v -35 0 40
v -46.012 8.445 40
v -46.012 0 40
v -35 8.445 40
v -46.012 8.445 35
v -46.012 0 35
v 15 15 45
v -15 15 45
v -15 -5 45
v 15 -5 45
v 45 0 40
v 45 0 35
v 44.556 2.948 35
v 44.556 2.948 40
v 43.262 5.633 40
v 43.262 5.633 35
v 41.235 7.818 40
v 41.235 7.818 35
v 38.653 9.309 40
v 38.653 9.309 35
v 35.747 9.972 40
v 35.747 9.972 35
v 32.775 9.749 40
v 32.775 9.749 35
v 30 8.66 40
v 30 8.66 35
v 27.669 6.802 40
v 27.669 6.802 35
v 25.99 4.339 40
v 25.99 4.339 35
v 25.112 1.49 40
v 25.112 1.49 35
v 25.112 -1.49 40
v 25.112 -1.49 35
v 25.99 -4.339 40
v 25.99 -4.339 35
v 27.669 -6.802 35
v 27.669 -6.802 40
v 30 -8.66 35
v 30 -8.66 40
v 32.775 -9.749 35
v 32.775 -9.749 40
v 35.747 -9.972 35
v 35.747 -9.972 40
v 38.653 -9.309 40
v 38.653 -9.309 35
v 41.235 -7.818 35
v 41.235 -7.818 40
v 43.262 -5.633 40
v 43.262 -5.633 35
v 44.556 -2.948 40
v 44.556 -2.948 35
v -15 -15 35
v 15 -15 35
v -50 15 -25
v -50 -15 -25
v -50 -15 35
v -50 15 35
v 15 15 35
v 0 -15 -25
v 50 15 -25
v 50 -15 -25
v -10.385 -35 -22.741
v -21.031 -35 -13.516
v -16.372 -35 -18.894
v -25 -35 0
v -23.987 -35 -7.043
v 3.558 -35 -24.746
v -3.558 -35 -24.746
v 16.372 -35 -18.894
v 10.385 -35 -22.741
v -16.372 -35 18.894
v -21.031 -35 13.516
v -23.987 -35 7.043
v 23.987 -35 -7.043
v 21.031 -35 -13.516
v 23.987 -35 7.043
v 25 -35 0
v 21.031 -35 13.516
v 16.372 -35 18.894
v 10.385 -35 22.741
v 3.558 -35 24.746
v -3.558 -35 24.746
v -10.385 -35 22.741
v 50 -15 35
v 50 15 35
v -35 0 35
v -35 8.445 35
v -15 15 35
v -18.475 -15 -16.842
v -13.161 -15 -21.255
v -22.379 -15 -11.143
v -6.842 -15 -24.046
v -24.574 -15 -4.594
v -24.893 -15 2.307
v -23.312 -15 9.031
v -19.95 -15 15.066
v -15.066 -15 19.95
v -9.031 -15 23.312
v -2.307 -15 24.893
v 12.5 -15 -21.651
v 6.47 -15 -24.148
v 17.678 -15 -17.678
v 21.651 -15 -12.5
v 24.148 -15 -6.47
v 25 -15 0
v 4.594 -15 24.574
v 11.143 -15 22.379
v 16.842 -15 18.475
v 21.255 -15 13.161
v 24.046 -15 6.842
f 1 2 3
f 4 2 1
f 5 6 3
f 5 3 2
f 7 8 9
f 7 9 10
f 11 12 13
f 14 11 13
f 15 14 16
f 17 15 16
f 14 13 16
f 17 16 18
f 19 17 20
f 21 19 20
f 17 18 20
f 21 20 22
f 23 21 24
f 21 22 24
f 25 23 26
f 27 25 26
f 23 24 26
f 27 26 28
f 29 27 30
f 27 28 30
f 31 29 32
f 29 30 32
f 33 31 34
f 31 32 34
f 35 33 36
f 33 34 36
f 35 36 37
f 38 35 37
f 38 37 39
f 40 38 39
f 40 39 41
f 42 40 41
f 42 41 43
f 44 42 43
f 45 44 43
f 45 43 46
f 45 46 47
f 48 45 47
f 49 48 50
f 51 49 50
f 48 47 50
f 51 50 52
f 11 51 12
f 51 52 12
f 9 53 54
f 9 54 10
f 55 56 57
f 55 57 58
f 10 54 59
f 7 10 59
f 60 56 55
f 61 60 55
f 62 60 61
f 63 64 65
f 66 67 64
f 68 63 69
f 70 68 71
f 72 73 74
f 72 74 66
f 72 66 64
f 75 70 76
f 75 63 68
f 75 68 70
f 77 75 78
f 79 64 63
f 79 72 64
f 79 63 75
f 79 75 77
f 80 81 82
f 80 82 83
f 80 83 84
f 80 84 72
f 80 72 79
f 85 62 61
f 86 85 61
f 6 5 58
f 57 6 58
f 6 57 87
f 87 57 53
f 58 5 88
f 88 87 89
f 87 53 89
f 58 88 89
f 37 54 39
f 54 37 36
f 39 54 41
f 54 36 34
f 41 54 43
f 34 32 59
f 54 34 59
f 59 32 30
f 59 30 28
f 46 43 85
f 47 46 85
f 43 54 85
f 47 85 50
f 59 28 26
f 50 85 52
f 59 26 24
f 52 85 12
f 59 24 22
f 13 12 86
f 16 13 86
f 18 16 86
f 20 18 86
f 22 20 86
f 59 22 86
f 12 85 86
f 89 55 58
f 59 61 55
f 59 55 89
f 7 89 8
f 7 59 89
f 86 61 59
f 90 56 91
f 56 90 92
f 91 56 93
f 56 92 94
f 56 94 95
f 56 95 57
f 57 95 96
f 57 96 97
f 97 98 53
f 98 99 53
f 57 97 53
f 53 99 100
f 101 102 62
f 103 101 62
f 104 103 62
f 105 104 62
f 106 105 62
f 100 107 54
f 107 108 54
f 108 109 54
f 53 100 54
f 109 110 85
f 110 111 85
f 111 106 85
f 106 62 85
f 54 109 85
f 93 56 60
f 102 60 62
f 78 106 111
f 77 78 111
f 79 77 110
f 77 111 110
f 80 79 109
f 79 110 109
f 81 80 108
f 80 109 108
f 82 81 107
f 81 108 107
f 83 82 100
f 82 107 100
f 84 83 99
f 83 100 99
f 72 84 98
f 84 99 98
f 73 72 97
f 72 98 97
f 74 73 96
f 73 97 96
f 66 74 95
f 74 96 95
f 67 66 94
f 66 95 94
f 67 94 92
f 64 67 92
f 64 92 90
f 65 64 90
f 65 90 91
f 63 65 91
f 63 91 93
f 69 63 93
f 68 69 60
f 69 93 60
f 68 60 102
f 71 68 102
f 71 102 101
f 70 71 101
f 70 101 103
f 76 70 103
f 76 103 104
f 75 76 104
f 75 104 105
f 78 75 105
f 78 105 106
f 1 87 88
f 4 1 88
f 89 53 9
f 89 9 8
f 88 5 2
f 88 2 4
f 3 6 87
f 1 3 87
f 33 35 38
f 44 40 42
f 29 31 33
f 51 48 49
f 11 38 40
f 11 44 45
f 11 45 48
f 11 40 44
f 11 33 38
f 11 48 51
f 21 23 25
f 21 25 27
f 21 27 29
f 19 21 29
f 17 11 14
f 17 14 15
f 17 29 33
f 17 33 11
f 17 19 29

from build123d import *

# Parameters (mm, degrees)
F0_W      = 100
F0_H      = 50
F1_DEPTH  = 15
F3_R      = 25
F4_DEPTH  = 20
F2_W      = 30
F2_H      = 10
F5_DEPTH  = 100
F6_R      = 10
F7_DEPTH  = 5
F8_W      = 11.012334
F8_H      = 8.445302
F9_DEPTH  = 5
F10_W     = 30
F10_H     = 30
F11_DEPTH = 10
F13_DEPTH = 65.001


with BuildPart() as f1:
    # F0 (on Front) → F1 (new body, symmetric)
    with BuildSketch(Plane.XZ):
        Rectangle(F0_W, F0_H)
    extrude(amount=F1_DEPTH, both=True)

    # F3 (on face) → F4 (join)
    with BuildSketch(Plane.XZ.offset(15)):
        Circle(F3_R)
    extrude(amount=F4_DEPTH)

    # F2 (on face) → F5 (join)
    with BuildSketch(Plane.YZ.offset(50)):
        with Locations((0, 30)):
            Rectangle(F2_W, F2_H)
    extrude(amount=-F5_DEPTH)

    # F6 (on face) → F7 (join)
    with BuildSketch(Plane.XY.offset(35)):
        with Locations((35, 0)):
            Circle(F6_R)
    extrude(amount=F7_DEPTH)

    # F8 (on face) → F9 (join)
    with BuildSketch(Plane.XY.offset(35)):
        with Locations((-40.506167, 4.222651)):
            Rectangle(F8_W, F8_H)
    extrude(amount=F9_DEPTH)

    # F10 (on face) → F11 (join)
    with BuildSketch(Plane.XY.offset(35)):
        Rectangle(F10_W, F10_H)
    extrude(amount=F11_DEPTH)

    # F12 (on face) → F13 (cut, through all)
    with BuildSketch(Plane.YZ.offset(15)):
        Polygon((-15, 45), (-15, 35), (-5, 45), align=None)
    extrude(amount=-F13_DEPTH, mode=Mode.SUBTRACT)


solid = f1.part
